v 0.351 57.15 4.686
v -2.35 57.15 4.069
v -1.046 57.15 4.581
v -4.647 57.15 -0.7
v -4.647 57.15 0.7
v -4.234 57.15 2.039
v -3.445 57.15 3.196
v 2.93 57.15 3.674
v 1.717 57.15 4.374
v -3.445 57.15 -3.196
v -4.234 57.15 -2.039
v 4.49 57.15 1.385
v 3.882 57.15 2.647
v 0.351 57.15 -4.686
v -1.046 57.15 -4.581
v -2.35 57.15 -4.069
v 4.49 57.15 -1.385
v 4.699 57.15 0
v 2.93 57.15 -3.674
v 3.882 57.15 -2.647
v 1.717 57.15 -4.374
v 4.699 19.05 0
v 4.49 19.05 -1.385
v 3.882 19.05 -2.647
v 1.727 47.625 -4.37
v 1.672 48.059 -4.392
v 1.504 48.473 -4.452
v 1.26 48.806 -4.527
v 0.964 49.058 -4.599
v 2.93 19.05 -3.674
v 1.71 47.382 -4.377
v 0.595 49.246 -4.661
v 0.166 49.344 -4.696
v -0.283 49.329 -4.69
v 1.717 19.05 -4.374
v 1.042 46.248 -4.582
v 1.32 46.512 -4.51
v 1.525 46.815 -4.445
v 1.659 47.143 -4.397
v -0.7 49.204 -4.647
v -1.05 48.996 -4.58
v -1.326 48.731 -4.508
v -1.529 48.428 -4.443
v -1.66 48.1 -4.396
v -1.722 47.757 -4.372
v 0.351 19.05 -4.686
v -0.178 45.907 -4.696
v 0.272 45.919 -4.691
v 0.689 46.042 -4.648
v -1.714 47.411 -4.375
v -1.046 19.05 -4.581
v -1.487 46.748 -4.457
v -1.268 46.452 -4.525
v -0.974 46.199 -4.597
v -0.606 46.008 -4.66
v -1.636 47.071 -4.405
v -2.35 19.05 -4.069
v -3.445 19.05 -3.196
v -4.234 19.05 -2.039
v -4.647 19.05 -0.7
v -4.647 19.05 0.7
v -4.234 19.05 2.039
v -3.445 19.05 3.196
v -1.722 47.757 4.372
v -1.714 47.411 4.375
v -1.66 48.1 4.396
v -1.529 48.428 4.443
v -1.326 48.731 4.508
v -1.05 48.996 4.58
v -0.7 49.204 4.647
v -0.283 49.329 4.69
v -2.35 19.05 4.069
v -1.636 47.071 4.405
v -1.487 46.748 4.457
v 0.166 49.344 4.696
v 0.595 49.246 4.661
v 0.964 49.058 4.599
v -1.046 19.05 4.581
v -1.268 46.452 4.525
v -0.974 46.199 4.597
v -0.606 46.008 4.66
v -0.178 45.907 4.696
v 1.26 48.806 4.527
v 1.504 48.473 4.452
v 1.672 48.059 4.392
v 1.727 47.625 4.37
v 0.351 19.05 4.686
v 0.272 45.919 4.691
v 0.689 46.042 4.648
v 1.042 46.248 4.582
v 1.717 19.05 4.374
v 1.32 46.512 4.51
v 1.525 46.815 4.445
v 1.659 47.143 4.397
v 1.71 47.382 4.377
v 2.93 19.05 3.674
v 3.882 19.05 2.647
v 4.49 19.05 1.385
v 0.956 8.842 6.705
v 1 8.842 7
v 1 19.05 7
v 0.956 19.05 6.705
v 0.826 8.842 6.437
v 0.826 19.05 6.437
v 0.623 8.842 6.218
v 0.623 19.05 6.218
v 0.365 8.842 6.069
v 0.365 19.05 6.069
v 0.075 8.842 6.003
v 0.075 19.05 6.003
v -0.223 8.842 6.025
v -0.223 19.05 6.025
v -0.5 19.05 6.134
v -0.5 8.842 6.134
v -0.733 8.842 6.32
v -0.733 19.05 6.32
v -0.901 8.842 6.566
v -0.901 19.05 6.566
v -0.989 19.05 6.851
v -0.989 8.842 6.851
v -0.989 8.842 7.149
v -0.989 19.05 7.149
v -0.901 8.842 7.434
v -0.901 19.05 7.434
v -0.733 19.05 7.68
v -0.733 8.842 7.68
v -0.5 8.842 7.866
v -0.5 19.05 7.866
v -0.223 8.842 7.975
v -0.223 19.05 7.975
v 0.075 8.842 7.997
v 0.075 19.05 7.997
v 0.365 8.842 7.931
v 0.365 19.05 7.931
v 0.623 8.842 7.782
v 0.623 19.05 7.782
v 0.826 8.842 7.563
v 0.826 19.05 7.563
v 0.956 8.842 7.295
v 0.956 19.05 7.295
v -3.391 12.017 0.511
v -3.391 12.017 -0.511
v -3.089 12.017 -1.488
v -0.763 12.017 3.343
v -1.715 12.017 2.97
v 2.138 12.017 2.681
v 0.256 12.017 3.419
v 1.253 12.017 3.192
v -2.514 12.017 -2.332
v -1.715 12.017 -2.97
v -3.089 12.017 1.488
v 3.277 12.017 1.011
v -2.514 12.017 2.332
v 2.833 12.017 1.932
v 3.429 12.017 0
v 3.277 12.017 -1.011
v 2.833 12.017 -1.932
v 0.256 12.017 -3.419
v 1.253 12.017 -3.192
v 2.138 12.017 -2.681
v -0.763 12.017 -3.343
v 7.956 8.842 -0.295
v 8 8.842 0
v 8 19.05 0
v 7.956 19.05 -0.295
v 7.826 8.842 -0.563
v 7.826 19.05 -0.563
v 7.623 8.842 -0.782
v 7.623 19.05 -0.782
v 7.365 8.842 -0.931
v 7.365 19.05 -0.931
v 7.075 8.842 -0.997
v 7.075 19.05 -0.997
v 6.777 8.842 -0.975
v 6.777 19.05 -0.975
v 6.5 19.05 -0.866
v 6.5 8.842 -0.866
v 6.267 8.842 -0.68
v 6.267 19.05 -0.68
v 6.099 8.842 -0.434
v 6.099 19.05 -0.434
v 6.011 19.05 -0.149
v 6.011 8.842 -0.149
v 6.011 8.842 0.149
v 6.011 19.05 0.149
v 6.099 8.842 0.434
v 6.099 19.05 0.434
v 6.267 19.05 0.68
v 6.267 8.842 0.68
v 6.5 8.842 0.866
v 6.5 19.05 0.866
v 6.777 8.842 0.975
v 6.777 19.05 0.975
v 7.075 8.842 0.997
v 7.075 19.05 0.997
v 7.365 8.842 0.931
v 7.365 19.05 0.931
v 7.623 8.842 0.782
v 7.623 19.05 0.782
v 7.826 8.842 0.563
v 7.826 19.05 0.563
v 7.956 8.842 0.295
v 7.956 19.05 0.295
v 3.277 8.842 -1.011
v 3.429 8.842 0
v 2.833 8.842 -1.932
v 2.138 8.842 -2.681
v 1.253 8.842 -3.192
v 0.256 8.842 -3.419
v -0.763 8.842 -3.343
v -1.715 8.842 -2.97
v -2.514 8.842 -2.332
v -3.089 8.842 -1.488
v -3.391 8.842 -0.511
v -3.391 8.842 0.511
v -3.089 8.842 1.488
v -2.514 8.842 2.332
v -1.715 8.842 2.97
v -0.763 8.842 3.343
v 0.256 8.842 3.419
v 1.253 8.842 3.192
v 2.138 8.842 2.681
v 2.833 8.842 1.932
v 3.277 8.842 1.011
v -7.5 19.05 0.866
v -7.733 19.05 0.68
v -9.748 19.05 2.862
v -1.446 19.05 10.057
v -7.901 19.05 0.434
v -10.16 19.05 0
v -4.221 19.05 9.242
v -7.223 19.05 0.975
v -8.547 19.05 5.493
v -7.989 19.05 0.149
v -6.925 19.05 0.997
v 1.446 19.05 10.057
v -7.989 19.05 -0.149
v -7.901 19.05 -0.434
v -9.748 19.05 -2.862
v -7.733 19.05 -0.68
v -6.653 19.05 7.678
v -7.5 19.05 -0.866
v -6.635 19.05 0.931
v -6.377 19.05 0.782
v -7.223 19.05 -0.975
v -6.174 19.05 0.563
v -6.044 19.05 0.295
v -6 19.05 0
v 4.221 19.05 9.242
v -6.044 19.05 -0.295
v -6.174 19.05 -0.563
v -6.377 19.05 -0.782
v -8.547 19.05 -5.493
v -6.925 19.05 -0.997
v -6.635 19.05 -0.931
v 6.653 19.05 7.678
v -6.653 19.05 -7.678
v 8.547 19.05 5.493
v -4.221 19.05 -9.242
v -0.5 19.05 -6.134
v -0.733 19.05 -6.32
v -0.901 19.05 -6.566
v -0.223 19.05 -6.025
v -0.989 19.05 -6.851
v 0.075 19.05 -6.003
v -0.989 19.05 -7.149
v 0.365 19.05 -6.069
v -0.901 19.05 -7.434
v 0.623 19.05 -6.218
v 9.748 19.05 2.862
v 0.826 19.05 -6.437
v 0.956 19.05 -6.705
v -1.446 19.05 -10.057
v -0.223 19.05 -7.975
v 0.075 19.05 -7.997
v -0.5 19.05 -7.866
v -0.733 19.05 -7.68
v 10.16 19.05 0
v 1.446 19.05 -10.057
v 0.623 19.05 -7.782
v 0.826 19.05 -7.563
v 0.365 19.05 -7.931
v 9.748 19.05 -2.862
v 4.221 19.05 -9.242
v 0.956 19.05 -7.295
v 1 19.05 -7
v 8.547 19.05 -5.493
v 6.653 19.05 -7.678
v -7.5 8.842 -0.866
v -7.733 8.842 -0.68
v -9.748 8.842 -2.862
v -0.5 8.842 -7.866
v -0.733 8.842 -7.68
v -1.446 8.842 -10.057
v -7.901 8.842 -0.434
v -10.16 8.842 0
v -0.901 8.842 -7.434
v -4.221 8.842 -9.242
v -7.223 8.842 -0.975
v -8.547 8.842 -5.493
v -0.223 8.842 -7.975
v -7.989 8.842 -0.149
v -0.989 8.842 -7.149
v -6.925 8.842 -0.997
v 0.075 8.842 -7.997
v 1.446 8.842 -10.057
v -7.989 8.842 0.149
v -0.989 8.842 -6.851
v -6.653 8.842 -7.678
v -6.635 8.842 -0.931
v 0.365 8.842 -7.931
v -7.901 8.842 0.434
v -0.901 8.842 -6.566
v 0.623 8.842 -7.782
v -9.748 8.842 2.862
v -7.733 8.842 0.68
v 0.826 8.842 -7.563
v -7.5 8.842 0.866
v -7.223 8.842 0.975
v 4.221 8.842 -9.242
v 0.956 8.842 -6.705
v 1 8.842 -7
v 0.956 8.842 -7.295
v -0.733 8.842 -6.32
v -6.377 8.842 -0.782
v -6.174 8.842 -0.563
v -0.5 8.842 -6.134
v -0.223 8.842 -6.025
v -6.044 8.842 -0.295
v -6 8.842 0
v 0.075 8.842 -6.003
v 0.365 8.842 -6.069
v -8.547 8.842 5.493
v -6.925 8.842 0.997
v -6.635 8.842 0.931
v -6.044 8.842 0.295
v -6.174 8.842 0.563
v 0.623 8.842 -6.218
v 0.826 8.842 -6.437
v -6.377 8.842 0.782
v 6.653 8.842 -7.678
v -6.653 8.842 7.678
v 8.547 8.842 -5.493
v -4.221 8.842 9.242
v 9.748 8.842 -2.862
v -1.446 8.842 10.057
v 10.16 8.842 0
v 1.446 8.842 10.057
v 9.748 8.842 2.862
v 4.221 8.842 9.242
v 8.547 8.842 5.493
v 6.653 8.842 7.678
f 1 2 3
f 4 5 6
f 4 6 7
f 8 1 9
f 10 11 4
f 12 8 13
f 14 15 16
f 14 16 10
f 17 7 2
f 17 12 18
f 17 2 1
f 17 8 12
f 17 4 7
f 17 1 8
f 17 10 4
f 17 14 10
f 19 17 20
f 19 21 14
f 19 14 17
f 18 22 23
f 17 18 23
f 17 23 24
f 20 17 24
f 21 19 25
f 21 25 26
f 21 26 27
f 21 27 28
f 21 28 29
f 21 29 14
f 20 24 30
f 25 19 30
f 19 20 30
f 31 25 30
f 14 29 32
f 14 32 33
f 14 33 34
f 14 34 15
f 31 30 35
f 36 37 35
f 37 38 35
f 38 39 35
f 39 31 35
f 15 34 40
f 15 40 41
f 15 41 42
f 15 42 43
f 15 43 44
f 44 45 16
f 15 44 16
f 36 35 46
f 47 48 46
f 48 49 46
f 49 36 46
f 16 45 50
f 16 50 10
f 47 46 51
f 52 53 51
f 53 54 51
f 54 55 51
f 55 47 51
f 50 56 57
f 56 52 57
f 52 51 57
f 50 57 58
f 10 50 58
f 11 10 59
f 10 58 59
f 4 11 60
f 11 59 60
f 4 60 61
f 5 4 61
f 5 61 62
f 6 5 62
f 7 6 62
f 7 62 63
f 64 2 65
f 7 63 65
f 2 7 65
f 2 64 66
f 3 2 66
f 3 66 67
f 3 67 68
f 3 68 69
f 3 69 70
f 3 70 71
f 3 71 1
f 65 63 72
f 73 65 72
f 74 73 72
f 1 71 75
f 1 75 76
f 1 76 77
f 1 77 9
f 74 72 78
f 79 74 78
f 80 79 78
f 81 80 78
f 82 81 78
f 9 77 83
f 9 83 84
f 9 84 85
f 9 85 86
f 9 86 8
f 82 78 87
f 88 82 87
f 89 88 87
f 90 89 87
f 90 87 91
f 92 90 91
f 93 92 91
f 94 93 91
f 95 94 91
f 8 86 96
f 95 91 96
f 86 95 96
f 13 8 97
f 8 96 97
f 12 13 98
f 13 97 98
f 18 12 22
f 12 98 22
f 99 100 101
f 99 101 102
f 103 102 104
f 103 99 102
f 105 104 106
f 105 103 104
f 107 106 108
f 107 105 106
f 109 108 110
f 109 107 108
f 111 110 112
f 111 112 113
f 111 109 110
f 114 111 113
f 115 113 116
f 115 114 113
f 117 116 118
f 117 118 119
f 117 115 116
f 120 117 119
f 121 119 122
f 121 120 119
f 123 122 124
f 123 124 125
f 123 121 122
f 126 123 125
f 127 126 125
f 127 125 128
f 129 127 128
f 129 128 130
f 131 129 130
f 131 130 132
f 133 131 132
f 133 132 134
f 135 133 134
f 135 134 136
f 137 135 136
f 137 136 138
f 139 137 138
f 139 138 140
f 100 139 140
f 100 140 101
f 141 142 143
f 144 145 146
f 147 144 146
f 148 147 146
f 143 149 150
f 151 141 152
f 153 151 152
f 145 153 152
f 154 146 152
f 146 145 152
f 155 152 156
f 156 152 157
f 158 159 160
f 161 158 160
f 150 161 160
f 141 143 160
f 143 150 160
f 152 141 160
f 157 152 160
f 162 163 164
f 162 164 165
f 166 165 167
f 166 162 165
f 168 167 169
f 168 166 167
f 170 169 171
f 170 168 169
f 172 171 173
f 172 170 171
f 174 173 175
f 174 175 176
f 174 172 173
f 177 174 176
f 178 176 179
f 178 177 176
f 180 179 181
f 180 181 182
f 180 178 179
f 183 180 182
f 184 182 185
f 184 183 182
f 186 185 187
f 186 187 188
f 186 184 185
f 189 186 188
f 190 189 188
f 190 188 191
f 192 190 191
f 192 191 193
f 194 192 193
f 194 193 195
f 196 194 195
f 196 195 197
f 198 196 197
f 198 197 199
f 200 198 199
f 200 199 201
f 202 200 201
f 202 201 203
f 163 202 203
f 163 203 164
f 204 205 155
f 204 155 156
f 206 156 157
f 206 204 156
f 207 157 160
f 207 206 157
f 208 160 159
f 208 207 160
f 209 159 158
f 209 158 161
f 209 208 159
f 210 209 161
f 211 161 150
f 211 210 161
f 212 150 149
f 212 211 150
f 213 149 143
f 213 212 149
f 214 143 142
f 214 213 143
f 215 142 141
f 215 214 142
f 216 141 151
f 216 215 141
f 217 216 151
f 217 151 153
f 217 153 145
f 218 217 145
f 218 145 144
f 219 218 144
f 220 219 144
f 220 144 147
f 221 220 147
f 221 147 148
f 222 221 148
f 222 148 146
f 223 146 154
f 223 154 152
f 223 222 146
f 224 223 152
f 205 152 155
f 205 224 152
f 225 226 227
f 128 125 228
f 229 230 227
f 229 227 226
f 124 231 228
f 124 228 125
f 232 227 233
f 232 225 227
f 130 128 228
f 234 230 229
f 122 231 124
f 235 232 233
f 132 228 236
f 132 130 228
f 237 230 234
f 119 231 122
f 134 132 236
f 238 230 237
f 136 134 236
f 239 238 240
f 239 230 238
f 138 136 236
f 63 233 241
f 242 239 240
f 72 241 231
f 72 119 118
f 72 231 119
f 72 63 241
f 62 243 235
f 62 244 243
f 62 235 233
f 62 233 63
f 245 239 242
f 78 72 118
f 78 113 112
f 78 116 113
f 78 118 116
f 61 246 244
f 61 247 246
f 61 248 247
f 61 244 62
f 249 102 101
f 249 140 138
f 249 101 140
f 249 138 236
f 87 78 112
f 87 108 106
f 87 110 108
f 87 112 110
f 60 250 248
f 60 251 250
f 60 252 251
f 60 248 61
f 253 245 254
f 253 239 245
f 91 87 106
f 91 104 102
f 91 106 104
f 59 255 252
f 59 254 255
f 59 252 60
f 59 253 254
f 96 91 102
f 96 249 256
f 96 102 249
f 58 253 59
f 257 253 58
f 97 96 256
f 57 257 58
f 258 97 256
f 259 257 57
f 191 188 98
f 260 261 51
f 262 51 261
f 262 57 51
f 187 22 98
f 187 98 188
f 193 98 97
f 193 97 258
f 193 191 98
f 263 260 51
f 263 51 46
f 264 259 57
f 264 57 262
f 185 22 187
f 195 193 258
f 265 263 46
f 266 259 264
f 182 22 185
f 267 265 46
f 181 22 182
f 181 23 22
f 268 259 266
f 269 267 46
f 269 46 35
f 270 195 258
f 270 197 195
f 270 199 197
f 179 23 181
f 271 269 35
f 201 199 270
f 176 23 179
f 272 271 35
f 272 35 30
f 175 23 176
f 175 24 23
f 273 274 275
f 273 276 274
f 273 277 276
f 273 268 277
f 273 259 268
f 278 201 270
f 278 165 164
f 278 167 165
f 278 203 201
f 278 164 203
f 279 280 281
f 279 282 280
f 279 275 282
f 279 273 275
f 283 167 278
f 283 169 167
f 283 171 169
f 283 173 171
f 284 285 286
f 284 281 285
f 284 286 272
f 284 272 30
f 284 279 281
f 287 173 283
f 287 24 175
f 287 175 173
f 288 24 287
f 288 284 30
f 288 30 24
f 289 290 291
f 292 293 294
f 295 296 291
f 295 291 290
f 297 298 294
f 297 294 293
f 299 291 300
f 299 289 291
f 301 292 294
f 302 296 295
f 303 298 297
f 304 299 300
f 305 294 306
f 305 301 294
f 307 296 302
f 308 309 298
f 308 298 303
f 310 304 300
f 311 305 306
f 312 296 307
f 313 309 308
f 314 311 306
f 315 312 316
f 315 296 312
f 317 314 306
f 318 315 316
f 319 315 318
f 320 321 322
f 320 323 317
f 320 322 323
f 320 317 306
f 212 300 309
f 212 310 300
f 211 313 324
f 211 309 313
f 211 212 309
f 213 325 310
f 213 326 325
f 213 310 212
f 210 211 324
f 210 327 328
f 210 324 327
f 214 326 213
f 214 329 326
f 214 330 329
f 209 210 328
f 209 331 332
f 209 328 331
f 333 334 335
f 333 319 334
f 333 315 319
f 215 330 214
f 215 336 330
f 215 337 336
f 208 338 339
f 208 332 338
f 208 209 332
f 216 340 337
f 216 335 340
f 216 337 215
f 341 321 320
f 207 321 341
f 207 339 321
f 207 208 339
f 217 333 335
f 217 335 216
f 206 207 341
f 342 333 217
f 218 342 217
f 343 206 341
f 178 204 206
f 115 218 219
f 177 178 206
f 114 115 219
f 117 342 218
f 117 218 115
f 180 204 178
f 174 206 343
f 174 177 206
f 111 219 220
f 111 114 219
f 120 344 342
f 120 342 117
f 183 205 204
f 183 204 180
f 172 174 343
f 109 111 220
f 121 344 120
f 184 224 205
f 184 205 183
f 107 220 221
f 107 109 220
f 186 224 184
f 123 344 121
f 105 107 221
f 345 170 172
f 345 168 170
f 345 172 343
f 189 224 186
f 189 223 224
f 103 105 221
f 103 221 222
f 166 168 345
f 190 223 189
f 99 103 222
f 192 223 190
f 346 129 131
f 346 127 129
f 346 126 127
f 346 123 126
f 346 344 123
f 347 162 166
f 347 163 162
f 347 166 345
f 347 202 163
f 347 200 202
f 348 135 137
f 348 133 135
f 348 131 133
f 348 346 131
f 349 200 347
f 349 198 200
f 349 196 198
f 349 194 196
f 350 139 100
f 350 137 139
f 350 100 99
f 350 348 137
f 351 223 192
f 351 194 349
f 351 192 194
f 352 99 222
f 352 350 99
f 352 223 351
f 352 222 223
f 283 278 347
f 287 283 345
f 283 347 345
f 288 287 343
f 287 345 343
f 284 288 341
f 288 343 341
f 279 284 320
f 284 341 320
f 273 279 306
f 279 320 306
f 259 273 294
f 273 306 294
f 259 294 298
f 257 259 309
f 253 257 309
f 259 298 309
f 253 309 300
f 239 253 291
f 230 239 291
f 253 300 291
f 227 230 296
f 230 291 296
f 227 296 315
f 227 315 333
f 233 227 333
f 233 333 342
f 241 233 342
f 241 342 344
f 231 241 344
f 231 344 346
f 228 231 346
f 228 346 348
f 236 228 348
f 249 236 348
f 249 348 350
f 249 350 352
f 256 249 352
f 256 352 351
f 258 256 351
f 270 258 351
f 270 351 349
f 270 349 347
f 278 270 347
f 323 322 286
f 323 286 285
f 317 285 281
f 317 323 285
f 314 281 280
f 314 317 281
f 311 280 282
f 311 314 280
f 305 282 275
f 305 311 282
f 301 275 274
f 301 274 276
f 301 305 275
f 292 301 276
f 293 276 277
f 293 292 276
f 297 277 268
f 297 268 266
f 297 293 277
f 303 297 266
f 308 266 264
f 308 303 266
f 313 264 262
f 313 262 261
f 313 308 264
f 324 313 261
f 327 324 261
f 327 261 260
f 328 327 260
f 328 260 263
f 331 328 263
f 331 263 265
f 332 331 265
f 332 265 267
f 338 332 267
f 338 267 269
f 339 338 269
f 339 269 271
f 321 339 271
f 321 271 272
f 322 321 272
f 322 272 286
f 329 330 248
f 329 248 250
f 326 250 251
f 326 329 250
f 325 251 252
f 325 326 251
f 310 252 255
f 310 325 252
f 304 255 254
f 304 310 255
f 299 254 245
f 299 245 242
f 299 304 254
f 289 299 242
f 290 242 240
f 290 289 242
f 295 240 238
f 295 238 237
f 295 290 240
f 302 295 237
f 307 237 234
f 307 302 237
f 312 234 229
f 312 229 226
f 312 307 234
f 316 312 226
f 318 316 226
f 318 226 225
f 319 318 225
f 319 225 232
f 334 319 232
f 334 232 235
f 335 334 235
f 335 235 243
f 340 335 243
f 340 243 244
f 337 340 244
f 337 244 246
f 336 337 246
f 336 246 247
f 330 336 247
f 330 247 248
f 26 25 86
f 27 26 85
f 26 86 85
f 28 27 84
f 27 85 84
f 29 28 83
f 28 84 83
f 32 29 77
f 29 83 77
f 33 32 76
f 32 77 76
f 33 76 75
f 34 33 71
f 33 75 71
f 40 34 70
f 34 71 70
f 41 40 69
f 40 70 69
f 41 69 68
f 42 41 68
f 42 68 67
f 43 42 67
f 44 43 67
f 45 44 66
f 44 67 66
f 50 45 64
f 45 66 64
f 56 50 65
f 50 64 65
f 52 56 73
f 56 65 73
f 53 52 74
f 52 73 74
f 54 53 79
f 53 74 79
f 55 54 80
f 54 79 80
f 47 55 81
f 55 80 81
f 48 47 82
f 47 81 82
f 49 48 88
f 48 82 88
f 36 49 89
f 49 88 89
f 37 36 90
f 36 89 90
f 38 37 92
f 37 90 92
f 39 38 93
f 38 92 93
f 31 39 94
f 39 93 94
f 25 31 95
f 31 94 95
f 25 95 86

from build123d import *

# Parameters (mm, degrees)
SKETCH1_R               = 10.16
SKETCH1_R_2             = 1.000000032
BOSS_EXTRUDE1_DEPTH     = 19.05
SKETCH2_R               = 4.699
BOSS_EXTRUDE2_DEPTH     = 38.1
SKETCH4_R               = 10.16
CUT_EXTRUDE2_DEPTH      = 8.842000096
CUT_EXTRUDE3_START      = 8.842
SKETCH3_R               = 3.429
CUT_EXTRUDE3_DEPTH      = 3.175
SKETCH5_R               = 1.726999975
CUT_EXTRUDE4_DEPTH      = 11.16
CUT_EXTRUDE4_DEPTH_BACK = 11.16


with BuildPart() as part:
    # Sketch1 → Boss-Extrude1 (new body)
    with BuildSketch(Plane(origin=(0, 0, 0), x_dir=(1, 0, 0), z_dir=(0, 1, 0))):
        Circle(SKETCH1_R)
        with Locations((6.99999997, 0)):
            Circle(SKETCH1_R_2, mode=Mode.SUBTRACT)
        with Locations((0, -6.99999997)):
            Circle(SKETCH1_R_2, mode=Mode.SUBTRACT)
        with Locations((-6.99999997, 0)):
            Circle(SKETCH1_R_2, mode=Mode.SUBTRACT)
        with Locations((0, 6.99999997)):
            Circle(SKETCH1_R_2, mode=Mode.SUBTRACT)
    extrude(amount=BOSS_EXTRUDE1_DEPTH)

    # Sketch2 → Boss-Extrude2 (add)
    with BuildSketch(Plane(origin=(0, 19.05, 0), x_dir=(1, 0, 0), z_dir=(0, 1, 0))):
        Circle(SKETCH2_R)
    extrude(amount=BOSS_EXTRUDE2_DEPTH)

    # Sketch4 → Cut-Extrude2 (cut)
    with BuildSketch(Plane.XZ):
        Circle(SKETCH4_R)
    extrude(amount=-CUT_EXTRUDE2_DEPTH, mode=Mode.SUBTRACT)

    # Sketch3 → Cut-Extrude3 (cut)
    with BuildSketch(Plane(origin=(0, 0, 0), x_dir=(1, 0, 0), z_dir=(0, 1, 0)).offset(CUT_EXTRUDE3_START)):
        Circle(SKETCH3_R)
    extrude(amount=CUT_EXTRUDE3_DEPTH, mode=Mode.SUBTRACT)

    # Sketch5 → Cut-Extrude4 (cut, two sides)
    with BuildSketch(Plane.XY) as cut_extrude4_sk:
        with Locations((0, 47.625)):
            Circle(SKETCH5_R)
    extrude(amount=CUT_EXTRUDE4_DEPTH, mode=Mode.SUBTRACT)
    extrude(cut_extrude4_sk.sketch, amount=-CUT_EXTRUDE4_DEPTH_BACK, mode=Mode.SUBTRACT)


solid = part.part
